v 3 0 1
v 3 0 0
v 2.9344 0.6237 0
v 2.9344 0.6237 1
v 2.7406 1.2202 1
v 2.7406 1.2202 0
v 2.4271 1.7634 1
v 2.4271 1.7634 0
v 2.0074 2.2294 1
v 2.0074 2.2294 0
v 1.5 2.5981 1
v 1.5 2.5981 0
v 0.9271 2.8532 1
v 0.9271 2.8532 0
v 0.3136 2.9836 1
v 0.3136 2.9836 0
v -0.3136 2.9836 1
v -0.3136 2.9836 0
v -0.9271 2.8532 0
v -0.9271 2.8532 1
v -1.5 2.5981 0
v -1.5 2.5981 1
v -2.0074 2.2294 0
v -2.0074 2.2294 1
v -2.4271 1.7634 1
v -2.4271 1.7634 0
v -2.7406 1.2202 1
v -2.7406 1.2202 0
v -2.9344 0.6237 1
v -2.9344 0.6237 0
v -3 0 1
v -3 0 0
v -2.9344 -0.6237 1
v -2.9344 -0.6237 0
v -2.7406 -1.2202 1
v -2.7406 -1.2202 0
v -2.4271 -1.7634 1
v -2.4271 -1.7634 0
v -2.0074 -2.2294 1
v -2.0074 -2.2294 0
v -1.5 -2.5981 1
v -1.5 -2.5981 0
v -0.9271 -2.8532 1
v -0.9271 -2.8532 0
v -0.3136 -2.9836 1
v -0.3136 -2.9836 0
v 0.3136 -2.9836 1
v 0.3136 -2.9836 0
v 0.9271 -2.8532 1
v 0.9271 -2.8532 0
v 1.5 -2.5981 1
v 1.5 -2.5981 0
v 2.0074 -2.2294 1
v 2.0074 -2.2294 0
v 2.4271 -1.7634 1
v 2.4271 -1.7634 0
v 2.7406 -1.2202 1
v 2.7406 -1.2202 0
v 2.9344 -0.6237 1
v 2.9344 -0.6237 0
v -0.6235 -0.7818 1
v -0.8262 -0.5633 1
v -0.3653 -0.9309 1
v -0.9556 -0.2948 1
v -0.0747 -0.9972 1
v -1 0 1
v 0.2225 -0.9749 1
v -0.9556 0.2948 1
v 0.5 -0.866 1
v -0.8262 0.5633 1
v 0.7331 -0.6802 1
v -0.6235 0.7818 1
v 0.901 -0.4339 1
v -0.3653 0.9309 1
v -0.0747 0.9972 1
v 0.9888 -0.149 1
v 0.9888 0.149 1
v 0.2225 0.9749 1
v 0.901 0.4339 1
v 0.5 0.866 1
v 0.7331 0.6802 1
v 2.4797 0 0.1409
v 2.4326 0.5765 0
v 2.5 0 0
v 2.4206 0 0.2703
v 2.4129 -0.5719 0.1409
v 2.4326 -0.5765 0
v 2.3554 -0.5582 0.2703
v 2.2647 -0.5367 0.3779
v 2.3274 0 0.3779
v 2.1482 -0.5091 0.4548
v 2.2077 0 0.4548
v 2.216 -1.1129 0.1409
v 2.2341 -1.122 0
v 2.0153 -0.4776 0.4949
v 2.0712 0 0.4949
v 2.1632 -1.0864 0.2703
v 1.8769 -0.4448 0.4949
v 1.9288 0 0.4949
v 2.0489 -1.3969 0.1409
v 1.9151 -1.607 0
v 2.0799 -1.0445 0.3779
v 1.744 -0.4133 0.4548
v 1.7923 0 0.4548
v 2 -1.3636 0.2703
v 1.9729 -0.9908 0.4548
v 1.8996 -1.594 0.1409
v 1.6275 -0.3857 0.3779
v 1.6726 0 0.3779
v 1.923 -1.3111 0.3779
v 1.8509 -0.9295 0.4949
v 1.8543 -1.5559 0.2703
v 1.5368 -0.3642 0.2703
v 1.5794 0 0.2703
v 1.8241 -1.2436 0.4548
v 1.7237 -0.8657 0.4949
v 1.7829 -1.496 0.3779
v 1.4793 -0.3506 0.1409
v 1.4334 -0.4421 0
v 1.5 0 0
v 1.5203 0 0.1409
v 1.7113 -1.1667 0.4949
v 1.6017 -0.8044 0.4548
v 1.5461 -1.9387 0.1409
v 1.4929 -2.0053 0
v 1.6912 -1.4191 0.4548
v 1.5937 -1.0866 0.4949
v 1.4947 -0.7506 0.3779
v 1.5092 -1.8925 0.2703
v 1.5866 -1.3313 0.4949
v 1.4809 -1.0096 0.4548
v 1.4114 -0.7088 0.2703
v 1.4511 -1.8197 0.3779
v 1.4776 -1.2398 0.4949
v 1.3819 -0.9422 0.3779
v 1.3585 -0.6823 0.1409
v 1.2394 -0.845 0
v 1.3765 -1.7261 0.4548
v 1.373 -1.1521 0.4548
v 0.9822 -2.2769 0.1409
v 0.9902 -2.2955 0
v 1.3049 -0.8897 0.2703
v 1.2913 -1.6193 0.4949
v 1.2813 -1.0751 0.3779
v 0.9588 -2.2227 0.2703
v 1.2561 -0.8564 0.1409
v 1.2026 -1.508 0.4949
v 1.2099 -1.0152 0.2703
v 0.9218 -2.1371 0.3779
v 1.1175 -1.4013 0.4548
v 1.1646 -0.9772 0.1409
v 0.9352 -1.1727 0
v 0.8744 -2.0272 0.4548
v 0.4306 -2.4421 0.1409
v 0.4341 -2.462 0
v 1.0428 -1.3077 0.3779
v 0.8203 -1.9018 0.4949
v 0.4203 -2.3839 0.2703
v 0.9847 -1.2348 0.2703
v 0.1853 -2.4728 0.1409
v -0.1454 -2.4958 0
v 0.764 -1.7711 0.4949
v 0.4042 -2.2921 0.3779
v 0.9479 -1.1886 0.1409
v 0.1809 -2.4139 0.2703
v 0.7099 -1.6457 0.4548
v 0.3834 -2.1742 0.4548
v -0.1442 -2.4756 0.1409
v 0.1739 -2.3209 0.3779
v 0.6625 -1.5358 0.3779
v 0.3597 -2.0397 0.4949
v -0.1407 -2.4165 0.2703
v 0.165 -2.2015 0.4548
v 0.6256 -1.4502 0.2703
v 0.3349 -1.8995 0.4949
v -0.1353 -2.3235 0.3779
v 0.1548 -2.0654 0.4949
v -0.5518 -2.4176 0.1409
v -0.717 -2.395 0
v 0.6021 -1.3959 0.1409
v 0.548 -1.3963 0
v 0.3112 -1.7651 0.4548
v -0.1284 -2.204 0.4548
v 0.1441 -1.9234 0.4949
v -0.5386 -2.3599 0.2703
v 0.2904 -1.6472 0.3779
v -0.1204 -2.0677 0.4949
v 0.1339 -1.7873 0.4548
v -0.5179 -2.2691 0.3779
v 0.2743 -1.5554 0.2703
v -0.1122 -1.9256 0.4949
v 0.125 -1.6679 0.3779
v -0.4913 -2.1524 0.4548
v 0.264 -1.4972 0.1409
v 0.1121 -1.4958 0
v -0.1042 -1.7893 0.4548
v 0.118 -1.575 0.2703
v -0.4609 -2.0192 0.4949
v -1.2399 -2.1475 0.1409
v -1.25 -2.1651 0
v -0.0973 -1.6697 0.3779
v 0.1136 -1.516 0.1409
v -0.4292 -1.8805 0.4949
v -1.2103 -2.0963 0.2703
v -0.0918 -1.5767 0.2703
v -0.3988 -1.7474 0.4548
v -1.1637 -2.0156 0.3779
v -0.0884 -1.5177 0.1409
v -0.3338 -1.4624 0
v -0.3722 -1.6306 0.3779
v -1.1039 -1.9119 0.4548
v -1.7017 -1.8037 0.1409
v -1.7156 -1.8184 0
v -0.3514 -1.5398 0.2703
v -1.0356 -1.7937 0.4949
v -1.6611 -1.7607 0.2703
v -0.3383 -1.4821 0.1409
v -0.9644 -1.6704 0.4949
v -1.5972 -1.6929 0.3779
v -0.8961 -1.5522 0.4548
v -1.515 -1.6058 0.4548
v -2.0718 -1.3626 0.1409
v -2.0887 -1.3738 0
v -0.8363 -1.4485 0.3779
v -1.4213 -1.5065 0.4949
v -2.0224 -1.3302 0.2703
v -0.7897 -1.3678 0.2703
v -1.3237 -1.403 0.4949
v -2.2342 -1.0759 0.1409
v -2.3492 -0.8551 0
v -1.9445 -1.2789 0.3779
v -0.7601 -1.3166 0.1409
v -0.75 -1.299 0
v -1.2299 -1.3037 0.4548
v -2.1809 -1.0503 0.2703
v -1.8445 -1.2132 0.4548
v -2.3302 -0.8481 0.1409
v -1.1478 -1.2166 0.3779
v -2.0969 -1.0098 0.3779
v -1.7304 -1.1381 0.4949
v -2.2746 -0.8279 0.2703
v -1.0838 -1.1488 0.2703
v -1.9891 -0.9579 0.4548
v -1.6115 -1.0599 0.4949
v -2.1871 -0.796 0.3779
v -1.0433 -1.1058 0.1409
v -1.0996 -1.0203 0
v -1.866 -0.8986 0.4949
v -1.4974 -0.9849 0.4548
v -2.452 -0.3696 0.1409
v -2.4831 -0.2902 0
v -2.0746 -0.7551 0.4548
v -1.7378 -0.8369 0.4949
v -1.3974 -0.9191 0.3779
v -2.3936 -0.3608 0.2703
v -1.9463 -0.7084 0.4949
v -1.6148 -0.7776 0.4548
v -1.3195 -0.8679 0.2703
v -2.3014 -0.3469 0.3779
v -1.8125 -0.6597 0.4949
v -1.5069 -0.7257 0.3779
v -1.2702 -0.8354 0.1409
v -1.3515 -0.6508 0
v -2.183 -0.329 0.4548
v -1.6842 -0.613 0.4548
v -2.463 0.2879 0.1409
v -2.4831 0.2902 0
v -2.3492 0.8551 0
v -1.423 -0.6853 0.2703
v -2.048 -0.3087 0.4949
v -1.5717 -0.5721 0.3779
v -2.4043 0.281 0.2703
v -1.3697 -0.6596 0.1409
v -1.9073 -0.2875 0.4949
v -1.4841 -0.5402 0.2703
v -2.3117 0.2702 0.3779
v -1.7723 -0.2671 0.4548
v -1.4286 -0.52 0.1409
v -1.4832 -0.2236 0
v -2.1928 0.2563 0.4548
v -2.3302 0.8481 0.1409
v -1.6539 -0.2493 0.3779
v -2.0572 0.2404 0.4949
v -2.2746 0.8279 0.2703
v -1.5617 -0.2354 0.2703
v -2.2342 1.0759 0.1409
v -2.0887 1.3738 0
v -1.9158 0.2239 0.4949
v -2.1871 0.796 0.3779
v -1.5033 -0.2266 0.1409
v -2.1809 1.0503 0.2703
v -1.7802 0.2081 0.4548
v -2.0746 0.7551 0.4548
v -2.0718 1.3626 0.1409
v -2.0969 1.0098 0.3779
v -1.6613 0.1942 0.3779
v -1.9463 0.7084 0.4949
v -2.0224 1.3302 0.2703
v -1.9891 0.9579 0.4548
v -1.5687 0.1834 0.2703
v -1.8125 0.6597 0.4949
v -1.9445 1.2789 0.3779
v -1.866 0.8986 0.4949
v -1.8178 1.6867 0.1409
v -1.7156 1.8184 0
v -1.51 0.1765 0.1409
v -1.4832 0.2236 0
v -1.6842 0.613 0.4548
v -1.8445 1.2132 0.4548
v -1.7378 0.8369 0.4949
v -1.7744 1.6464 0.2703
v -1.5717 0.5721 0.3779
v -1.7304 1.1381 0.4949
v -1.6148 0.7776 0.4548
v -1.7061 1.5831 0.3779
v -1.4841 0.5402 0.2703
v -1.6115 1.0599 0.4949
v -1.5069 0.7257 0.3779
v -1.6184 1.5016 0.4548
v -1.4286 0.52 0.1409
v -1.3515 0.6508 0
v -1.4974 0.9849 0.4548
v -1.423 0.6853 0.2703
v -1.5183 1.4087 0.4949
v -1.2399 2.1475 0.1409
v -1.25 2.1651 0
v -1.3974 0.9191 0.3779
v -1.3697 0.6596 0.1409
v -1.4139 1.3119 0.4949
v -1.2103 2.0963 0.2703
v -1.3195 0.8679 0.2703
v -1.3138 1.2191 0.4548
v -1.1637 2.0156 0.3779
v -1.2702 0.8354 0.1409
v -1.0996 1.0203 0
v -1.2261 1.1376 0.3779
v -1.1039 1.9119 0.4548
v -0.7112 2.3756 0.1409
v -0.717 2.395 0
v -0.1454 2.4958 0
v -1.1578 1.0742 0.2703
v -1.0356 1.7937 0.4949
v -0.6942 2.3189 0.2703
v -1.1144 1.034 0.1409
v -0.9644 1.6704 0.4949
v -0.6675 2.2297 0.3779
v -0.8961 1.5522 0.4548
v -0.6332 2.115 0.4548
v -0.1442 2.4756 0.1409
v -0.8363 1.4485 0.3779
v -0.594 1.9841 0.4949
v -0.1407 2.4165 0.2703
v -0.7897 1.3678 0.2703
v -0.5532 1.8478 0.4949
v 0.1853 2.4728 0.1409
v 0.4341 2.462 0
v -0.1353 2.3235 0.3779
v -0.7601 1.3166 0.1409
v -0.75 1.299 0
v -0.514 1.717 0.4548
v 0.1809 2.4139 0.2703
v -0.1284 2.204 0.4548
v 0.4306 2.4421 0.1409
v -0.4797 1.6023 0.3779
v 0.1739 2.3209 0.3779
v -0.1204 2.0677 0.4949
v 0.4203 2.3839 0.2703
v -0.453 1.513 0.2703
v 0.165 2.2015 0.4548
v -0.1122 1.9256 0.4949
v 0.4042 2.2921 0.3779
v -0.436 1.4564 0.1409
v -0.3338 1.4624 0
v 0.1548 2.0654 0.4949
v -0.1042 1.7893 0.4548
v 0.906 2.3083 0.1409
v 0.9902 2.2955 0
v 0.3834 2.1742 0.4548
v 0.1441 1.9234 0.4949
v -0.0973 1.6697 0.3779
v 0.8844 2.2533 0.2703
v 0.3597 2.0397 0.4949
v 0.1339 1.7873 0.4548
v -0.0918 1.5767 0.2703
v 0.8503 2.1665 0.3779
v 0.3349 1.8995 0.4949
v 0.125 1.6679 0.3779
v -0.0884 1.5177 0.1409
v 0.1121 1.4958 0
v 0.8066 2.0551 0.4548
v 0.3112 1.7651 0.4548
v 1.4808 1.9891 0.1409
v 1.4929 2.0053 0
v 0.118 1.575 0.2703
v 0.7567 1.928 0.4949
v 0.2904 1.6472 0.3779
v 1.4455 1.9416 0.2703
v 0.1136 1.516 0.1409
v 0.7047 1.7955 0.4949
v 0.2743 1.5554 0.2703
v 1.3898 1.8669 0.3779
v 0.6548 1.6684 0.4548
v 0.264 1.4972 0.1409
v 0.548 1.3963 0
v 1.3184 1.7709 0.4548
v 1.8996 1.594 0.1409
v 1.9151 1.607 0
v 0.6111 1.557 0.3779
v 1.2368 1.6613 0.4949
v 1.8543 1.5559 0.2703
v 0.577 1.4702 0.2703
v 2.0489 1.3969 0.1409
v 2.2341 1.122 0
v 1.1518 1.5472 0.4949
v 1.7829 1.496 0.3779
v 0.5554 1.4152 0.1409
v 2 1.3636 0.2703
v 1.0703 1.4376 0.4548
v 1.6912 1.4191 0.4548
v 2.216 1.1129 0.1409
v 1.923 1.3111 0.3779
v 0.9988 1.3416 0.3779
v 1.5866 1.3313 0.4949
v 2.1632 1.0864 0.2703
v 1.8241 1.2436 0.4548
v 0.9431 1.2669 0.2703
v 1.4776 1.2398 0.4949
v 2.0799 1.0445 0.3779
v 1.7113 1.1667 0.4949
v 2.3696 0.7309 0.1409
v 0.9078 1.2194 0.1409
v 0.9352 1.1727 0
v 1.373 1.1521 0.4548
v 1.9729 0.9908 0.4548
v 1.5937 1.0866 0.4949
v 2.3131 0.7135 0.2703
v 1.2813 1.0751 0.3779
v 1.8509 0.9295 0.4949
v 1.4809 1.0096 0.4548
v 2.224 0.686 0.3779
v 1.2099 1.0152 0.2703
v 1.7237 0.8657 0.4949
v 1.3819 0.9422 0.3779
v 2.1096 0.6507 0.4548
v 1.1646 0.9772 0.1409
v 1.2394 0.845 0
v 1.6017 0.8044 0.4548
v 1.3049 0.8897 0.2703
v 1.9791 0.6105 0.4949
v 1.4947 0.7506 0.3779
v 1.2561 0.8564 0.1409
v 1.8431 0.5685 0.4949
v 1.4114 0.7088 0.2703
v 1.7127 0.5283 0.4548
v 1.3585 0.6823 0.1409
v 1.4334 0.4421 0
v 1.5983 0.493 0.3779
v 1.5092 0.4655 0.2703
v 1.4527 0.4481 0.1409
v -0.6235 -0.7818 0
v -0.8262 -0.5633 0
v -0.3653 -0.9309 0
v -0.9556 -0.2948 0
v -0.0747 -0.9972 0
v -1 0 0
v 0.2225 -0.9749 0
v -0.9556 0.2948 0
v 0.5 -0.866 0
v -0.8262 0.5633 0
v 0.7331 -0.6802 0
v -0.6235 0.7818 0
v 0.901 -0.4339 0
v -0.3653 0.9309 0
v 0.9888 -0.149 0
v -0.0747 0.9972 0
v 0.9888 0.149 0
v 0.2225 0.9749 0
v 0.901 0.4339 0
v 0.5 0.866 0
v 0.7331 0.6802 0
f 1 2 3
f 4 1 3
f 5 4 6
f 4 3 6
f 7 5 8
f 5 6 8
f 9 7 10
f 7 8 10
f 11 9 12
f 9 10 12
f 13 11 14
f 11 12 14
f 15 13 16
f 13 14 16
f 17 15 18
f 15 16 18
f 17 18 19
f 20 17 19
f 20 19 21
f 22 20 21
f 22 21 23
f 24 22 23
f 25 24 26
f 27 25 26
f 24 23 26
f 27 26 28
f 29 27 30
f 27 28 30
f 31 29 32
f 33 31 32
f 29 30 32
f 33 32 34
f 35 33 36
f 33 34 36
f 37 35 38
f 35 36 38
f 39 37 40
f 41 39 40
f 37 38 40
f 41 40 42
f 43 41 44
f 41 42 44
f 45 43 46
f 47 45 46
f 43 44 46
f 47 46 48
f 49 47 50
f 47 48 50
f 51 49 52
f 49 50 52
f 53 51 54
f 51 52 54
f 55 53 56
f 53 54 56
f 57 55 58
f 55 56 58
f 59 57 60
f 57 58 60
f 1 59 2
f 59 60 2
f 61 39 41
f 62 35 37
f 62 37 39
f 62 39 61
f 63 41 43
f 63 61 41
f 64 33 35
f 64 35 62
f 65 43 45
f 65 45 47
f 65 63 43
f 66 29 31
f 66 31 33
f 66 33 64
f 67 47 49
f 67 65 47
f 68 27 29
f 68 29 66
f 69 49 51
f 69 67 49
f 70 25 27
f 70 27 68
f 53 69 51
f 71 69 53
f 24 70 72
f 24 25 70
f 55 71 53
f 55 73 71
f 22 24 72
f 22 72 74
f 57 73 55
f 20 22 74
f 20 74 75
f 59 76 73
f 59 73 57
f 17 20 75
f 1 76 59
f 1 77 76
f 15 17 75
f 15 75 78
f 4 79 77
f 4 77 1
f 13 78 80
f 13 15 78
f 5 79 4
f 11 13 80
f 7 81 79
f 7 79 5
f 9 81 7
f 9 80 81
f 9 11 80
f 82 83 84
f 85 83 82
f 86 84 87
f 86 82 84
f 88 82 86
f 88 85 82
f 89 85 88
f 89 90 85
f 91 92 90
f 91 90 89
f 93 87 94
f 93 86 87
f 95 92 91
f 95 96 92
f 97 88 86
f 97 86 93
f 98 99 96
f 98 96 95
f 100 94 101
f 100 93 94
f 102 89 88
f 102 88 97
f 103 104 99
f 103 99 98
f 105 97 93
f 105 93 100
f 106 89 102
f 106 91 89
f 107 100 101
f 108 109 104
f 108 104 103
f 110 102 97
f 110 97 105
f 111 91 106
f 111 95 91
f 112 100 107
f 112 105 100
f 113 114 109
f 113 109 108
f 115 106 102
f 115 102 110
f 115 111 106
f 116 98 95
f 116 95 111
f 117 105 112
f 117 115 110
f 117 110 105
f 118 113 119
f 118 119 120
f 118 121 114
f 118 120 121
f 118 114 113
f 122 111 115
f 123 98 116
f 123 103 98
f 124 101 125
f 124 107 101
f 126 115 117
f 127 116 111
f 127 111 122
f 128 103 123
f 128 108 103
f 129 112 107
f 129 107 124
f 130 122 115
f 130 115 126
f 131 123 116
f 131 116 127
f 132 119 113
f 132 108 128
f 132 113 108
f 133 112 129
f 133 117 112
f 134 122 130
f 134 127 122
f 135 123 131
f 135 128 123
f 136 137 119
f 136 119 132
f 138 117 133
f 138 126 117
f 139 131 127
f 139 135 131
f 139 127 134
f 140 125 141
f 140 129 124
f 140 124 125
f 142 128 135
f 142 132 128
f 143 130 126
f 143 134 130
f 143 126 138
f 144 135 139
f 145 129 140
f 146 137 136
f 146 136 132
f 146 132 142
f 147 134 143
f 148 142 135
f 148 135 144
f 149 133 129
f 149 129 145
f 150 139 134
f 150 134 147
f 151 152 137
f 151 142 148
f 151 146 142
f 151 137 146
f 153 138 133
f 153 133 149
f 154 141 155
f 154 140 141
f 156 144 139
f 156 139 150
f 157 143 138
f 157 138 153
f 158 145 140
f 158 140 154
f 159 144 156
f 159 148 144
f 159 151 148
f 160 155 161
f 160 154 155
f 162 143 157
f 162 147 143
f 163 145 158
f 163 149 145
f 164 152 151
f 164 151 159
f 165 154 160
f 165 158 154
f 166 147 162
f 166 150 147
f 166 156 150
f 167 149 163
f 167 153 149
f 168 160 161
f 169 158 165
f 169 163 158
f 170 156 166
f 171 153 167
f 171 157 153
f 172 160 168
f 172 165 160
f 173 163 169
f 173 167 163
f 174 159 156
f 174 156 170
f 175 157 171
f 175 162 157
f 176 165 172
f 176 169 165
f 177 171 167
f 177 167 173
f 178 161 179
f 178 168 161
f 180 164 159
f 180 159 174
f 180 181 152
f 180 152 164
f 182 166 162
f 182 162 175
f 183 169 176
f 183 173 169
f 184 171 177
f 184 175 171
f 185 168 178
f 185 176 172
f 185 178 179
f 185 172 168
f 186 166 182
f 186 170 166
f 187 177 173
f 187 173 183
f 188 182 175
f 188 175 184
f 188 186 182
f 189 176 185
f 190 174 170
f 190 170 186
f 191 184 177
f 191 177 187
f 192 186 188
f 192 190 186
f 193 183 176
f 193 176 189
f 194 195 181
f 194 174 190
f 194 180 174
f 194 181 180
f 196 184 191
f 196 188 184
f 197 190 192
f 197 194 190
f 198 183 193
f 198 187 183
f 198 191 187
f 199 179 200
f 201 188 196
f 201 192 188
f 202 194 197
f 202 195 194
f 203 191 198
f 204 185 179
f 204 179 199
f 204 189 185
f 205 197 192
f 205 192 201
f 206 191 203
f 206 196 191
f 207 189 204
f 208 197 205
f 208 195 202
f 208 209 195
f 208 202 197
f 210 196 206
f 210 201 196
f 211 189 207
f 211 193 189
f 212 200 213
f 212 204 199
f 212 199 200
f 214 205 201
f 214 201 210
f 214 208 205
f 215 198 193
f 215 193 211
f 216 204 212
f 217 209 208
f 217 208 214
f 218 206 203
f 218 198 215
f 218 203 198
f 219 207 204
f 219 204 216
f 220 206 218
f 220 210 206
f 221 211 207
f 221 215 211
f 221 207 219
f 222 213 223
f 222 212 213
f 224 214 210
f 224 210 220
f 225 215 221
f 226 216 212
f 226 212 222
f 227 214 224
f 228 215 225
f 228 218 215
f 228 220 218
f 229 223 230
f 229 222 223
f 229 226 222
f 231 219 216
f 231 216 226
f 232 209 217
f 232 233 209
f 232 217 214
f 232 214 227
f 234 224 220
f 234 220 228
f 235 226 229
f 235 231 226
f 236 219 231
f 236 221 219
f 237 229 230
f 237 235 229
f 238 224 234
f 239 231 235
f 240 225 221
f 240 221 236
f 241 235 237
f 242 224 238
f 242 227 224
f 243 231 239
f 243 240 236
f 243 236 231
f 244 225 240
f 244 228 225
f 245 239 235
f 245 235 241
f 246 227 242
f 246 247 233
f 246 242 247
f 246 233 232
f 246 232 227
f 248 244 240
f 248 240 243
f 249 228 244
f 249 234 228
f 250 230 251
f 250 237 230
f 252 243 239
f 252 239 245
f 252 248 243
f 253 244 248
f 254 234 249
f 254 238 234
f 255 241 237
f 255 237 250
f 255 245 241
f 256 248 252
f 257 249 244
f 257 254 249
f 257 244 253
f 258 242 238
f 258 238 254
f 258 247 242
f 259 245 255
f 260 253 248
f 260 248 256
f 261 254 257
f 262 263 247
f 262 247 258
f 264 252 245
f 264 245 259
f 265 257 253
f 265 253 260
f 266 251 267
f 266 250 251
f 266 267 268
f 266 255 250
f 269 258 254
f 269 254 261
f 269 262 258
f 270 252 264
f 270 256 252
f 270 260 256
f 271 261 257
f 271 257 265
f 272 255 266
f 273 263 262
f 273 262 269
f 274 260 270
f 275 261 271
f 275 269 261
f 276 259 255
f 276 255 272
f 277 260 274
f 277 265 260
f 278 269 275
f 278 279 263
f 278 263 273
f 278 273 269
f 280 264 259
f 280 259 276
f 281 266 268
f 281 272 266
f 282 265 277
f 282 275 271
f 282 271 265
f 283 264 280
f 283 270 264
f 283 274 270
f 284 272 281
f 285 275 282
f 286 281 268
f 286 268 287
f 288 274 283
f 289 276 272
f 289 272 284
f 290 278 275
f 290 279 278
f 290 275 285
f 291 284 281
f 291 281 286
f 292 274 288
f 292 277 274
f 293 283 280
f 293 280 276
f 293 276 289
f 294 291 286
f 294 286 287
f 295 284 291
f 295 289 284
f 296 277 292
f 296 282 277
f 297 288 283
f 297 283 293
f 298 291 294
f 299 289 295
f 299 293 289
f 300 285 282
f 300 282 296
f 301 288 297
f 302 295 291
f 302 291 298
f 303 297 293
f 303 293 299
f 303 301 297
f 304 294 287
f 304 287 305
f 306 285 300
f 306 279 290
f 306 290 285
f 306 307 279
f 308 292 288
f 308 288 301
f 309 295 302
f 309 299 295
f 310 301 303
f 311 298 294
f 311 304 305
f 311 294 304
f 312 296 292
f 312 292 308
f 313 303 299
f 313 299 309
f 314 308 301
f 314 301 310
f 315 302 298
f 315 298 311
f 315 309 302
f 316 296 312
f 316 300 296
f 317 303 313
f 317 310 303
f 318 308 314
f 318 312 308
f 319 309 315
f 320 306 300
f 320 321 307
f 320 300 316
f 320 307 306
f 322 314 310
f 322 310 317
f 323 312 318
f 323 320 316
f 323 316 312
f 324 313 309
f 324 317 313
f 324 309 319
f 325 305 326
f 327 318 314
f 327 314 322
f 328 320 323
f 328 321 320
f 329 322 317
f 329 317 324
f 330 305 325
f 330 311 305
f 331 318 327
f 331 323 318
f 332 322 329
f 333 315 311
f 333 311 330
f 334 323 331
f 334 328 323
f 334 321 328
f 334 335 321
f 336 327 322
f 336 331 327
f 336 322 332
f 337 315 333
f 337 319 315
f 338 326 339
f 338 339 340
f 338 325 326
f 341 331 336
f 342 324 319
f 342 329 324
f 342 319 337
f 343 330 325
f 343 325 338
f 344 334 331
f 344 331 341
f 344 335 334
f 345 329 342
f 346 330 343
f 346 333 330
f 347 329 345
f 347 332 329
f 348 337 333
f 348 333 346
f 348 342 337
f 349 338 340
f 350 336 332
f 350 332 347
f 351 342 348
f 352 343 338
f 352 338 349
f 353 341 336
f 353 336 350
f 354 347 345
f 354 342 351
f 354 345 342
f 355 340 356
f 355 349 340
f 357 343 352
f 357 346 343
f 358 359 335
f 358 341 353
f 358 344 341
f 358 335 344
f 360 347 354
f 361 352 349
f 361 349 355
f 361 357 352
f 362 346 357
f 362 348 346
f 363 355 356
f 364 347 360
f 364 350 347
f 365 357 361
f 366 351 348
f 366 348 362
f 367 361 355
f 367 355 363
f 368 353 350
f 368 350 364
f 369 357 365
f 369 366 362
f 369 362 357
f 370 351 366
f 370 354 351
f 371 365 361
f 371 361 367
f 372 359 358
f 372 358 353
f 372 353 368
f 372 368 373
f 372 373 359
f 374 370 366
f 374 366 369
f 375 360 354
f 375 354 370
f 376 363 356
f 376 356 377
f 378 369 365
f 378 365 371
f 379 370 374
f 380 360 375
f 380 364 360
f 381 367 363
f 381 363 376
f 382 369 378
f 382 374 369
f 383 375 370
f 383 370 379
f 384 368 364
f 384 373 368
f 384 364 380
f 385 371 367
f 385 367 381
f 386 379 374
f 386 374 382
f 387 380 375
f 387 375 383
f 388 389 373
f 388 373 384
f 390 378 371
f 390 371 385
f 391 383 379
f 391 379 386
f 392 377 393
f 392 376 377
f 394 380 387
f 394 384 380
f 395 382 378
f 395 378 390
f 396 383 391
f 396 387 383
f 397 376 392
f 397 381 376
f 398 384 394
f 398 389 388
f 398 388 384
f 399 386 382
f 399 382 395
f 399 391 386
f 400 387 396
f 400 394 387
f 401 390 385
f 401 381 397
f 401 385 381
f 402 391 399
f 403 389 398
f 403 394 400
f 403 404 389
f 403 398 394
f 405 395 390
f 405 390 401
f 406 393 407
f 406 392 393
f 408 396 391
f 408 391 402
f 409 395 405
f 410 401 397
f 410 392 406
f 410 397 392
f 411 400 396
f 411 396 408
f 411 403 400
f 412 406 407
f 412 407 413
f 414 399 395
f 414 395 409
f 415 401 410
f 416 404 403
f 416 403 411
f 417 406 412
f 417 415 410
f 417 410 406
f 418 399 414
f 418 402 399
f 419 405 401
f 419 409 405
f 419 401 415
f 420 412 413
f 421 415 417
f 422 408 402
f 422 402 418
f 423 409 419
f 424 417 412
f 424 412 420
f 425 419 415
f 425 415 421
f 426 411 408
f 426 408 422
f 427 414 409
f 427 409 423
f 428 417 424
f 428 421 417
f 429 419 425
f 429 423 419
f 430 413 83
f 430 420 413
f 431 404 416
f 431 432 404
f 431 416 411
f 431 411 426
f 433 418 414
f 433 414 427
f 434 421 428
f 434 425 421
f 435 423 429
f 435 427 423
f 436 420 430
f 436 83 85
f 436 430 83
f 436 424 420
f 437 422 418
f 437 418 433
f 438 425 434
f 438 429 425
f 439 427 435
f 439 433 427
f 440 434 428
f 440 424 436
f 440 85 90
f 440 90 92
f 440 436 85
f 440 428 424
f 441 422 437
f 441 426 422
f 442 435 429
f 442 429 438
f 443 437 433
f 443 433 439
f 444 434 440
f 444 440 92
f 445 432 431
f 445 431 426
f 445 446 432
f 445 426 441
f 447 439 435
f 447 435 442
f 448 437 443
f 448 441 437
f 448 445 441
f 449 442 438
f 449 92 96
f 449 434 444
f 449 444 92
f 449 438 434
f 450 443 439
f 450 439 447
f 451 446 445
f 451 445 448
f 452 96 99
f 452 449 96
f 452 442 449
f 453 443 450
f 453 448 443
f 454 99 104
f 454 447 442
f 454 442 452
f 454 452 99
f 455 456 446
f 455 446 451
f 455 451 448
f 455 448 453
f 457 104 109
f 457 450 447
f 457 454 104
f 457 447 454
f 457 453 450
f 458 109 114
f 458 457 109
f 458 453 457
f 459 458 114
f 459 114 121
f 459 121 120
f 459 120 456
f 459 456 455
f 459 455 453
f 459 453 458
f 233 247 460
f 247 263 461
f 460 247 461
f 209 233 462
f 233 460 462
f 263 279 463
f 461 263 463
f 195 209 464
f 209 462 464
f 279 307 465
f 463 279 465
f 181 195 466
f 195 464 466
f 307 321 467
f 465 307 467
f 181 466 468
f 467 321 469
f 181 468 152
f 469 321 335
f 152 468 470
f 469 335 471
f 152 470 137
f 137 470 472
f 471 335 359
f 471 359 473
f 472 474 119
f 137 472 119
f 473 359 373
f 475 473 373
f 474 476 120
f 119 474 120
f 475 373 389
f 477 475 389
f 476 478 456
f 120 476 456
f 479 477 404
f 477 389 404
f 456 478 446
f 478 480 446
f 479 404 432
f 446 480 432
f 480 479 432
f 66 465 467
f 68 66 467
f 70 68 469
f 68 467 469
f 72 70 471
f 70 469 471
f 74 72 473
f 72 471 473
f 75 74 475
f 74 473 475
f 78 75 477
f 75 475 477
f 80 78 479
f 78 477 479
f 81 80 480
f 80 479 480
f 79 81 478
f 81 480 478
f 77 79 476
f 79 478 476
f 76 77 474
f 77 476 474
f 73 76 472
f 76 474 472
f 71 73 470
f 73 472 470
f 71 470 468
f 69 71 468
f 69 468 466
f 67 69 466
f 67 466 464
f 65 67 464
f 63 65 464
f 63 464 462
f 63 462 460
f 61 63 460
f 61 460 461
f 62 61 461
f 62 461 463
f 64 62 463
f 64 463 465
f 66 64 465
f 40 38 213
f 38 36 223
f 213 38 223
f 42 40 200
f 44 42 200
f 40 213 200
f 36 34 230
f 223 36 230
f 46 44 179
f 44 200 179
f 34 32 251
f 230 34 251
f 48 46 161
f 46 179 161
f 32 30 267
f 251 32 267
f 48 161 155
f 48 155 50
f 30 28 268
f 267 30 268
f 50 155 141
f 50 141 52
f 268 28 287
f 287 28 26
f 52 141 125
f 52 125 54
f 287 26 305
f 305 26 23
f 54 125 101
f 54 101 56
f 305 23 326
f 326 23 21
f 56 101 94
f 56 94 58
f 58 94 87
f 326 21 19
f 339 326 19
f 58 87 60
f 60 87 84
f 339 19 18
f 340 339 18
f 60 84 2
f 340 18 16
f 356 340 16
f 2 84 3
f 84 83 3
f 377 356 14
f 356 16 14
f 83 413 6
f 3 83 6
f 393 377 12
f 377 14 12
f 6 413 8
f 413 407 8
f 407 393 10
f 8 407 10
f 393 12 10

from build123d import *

# Parameters (mm, degrees)
SKETCH_1_R          = 3
EXTRUDE_1_DEPTH     = 1
SKETCH_3_R          = 1
CUT_EXTRUDE_1_DEPTH = 5.358898944


with BuildPart() as part:
    # 草图1 → 凸台-拉伸1 (new body)
    with BuildSketch(Plane.XY):
        Circle(SKETCH_1_R)
    extrude(amount=EXTRUDE_1_DEPTH)

    # 草图2 → 切除-旋转1 (revolve, cut)
    with BuildSketch(Plane(origin=(0, 0, 0), x_dir=(1, 0, 0), z_dir=(0, 1, 0))):
        with BuildLine():
            Line((1.5, 0), (2.5, 0))
            ThreePointArc((2.5, 0), (2, -0.5), (1.5, 0))
        make_face()
    revolve(axis=Axis((0, 0, 1), (0, 0, -1)), mode=Mode.SUBTRACT)

    # 草图3 → 切除-拉伸1 (cut, through all)
    with BuildSketch(Plane(origin=(0, 0, 0), x_dir=(-1, 0, 0), z_dir=(0, 0, -1))):
        Circle(SKETCH_3_R)
    extrude(amount=-CUT_EXTRUDE_1_DEPTH, mode=Mode.SUBTRACT)


solid = part.part
